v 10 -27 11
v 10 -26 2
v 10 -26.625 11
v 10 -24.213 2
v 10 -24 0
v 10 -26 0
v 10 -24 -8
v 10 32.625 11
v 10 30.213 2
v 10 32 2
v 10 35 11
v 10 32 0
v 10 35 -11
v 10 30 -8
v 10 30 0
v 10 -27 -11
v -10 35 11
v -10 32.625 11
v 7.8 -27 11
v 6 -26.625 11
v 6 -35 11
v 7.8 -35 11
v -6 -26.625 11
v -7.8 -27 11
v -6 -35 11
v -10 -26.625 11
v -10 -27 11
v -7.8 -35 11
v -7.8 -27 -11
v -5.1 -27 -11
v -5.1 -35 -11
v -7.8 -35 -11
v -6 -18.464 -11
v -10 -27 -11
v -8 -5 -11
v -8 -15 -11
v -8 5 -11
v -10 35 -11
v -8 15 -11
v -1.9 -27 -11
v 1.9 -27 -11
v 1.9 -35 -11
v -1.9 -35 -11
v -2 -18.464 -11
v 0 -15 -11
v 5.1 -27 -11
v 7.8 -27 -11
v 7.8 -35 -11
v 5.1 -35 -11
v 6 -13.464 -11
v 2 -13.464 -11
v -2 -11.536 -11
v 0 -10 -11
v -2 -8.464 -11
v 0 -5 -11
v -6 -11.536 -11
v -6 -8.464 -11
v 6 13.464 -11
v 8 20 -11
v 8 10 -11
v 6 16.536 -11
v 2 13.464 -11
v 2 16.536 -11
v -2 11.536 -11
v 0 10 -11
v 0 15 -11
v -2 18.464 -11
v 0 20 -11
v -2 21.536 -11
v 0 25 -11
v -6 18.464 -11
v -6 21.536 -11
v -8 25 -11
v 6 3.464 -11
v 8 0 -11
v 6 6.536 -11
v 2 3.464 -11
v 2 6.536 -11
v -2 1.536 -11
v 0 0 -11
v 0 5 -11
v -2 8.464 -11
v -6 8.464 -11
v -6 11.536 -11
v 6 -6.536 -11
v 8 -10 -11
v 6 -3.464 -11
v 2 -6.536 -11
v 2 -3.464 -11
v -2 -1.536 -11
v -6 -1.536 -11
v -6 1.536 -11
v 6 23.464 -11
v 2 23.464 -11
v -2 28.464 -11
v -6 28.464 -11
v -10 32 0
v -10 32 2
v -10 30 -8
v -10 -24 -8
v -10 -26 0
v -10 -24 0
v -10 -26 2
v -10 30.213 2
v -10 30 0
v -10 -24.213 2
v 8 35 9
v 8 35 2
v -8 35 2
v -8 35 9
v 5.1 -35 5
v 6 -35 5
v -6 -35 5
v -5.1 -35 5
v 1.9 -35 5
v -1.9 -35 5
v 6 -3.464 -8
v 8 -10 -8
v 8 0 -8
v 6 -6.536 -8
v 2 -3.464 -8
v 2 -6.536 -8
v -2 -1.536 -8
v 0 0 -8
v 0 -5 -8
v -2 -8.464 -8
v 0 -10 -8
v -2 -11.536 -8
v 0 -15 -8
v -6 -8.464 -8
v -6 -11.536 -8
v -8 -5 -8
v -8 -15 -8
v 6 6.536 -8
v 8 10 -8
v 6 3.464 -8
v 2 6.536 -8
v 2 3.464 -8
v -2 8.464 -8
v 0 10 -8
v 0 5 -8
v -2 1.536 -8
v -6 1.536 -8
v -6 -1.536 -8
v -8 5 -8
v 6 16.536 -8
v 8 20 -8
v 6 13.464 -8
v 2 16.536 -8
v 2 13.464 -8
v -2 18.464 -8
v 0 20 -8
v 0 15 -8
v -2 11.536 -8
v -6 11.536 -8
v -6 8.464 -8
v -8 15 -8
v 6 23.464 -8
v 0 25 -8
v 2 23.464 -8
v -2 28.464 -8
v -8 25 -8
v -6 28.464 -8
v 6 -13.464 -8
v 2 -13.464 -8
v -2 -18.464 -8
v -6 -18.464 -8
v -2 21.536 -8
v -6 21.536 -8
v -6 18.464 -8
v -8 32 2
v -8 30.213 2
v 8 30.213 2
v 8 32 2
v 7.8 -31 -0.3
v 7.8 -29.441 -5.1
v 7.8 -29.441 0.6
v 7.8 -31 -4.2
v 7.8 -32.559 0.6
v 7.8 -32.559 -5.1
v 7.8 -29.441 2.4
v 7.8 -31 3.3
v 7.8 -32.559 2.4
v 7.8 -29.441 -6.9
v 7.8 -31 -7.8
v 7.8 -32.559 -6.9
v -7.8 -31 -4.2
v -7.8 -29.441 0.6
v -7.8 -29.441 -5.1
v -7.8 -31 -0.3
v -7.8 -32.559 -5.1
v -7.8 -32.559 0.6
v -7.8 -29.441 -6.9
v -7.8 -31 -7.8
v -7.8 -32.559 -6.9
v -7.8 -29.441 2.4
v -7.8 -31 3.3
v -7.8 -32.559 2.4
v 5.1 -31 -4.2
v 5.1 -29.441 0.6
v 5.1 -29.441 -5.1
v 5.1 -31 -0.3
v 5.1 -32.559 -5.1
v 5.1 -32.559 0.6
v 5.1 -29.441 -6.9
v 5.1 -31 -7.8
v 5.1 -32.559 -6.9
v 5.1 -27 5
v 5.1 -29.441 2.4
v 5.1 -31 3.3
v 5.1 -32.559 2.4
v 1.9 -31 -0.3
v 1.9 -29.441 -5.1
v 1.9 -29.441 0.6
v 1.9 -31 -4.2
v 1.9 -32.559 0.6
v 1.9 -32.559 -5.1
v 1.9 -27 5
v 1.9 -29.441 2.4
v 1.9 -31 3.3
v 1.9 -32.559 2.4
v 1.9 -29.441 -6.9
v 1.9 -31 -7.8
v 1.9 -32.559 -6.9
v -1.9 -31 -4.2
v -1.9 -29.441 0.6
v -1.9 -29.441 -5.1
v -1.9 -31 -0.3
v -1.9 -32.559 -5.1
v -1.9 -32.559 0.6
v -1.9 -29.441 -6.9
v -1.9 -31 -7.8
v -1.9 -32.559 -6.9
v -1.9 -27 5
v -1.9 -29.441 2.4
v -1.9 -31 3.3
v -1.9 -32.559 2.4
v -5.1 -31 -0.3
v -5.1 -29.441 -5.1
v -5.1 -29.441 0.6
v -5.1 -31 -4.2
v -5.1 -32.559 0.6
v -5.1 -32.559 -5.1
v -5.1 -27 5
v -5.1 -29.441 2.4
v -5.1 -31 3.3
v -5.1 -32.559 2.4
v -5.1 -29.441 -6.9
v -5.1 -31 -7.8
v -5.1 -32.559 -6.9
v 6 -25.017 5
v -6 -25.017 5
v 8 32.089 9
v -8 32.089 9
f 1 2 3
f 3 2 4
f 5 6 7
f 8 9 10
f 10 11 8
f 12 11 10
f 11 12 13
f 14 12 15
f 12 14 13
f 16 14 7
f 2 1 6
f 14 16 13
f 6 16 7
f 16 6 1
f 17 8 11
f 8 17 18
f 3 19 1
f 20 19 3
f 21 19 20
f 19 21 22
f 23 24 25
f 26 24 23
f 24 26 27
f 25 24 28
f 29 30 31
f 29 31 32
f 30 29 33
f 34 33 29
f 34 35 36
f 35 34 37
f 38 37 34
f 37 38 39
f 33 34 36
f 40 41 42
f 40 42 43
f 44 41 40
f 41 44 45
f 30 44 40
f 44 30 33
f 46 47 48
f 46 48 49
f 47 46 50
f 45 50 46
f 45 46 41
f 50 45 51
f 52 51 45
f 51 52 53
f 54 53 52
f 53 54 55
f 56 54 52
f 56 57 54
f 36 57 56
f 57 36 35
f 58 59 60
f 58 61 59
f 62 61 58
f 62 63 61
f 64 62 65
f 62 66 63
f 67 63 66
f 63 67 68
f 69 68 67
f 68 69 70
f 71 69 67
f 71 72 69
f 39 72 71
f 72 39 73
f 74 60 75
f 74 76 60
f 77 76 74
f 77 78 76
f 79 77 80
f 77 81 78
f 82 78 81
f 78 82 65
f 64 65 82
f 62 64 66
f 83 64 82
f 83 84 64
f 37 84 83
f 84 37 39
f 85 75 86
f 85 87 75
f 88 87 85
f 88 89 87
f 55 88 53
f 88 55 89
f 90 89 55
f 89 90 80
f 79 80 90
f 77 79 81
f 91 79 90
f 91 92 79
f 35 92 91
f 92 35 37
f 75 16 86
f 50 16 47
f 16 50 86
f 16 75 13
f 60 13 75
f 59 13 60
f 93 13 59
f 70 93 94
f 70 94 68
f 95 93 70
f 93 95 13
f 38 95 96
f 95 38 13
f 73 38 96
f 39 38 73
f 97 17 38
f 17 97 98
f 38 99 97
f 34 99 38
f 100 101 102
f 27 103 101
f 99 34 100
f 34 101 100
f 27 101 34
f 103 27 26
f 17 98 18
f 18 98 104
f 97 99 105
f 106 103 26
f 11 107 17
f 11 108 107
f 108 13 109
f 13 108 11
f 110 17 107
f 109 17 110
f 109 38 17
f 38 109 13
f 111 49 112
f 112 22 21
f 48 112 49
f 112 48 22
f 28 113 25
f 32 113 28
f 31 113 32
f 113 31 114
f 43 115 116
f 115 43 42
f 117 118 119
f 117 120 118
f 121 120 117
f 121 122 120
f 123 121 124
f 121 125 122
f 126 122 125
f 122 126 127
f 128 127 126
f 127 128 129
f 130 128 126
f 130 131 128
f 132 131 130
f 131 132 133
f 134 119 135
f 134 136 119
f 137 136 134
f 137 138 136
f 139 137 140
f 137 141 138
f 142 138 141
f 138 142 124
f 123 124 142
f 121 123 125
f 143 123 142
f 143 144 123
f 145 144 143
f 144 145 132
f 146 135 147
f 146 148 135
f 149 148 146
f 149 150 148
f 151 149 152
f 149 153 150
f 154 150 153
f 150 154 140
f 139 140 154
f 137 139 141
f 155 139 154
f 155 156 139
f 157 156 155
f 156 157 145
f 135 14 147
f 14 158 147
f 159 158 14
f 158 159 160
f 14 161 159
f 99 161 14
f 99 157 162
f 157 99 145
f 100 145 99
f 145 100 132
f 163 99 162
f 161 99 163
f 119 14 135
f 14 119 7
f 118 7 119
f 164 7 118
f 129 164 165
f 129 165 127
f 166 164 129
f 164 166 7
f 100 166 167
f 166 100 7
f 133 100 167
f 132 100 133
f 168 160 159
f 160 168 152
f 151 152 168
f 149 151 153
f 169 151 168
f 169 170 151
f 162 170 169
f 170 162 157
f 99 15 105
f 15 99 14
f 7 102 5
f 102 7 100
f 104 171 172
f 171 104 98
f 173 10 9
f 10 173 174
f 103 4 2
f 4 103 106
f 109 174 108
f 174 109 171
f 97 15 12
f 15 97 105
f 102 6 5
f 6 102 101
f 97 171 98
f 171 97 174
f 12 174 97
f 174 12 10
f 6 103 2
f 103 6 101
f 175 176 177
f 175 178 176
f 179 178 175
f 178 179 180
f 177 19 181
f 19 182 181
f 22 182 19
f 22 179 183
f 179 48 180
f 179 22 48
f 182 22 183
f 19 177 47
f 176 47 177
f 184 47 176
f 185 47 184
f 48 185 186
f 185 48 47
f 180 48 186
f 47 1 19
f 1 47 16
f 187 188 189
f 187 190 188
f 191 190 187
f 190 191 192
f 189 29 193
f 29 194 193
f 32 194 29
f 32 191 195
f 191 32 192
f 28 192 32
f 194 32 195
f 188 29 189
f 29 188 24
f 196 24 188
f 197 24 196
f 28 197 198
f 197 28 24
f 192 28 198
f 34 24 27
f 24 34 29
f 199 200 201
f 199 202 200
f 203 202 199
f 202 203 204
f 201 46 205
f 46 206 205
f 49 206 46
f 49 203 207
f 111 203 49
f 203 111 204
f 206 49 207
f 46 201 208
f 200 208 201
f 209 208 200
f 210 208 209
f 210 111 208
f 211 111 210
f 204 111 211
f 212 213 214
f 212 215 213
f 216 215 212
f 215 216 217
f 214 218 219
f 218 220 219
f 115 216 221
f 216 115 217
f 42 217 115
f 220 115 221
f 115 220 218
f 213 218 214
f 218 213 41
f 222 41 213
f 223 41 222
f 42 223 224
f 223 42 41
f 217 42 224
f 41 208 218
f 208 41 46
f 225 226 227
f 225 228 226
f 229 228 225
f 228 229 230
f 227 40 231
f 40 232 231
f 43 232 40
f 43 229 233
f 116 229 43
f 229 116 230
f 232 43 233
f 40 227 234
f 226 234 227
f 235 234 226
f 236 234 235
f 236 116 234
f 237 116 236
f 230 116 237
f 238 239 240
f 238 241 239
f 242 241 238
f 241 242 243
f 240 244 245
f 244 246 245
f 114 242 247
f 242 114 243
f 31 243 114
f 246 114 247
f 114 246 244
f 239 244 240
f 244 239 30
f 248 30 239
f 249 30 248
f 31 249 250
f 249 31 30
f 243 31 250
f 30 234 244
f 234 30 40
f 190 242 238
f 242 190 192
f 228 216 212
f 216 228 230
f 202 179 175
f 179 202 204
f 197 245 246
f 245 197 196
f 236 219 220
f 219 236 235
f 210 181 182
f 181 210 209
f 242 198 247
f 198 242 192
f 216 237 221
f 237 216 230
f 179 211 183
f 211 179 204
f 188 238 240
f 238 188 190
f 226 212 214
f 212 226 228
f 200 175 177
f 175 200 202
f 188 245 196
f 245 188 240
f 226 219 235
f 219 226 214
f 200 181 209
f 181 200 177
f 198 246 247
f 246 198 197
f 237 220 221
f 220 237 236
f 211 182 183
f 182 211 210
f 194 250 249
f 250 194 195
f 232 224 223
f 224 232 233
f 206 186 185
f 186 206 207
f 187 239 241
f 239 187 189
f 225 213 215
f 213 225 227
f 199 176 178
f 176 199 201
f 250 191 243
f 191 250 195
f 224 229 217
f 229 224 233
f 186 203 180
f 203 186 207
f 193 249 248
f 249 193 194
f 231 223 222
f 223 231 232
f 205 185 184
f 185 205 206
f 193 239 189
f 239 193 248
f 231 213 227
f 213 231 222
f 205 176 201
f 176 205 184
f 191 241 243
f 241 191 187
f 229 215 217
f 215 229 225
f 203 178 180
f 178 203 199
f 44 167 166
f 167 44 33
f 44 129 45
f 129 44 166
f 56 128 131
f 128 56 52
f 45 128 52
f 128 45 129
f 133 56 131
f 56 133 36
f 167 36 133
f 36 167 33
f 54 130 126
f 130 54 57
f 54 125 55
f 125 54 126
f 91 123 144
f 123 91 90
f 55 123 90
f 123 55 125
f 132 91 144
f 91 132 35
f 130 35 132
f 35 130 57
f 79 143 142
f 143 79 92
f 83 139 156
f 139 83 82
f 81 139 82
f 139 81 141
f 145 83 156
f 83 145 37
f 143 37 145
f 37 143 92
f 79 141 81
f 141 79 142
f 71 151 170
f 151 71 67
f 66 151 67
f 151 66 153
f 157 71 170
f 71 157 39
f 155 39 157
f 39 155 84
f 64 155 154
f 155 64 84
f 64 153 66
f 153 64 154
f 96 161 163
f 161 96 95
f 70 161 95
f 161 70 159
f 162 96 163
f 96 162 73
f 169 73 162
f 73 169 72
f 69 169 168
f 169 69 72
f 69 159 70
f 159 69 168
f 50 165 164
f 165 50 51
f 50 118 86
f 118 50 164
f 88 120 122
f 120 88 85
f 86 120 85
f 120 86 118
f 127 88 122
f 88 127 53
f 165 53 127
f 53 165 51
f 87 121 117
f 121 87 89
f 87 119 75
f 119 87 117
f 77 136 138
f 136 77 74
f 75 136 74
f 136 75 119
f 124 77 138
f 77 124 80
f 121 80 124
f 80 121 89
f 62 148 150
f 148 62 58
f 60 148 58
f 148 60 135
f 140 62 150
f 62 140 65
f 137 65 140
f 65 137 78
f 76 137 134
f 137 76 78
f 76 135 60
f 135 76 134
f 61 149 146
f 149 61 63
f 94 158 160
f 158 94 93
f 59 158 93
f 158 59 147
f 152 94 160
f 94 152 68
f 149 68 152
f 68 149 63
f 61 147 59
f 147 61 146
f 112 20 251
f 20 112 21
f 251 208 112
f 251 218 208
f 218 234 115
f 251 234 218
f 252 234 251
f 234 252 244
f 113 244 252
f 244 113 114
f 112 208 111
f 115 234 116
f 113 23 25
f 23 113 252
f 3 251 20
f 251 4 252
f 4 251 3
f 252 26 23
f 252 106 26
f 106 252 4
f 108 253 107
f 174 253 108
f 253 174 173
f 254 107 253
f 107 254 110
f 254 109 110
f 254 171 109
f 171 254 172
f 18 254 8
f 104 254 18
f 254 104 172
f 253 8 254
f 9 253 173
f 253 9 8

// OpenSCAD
difference () {
  cube ([20, 70, 22], center=true);
  translate ([0, 3, 1.5]) {
    cube ([20, 54, 19], center=true);
  }
  translate ([0, 3, 1]) {
    cube ([20, 58, 2], center=true);
  }
  translate ([8.9, -31, ]) {
    cube ([2.2, 8, 22], center=true);
  }
  translate ([-8.9, -31, ]) {
    cube ([2.2, 8, 22], center=true);
  }
  translate ([3.5, -31, ]) {
    cube ([3.2, 8, 22], center=true);
  }
  translate ([-3.5, -31, ]) {
    cube ([3.2, 8, 22], center=true);
  }
  translate ([0, -31, 1.5]) {
    rotate (a=90.0, v=[0, 1, 0]) {
      cylinder (h=20, r=1.8, center=true);
    }
  }
  translate ([0, -31, -6]) {
    rotate (a=90.0, v=[0, 1, 0]) {
      cylinder (h=20, r=1.8, center=true);
    }
  }
  translate ([-4, -15, ]) {
    cylinder ($fn=6, h=22, r=4, center=true);
  }
  translate ([-4, -5, ]) {
    cylinder ($fn=6, h=22, r=4, center=true);
  }
  translate ([-4, 5, ]) {
    cylinder ($fn=6, h=22, r=4, center=true);
  }
  translate ([-4, 15, ]) {
    cylinder ($fn=6, h=22, r=4, center=true);
  }
  translate ([-4, 25, ]) {
    cylinder ($fn=6, h=22, r=4, center=true);
  }
  translate ([4, -10, ]) {
    cylinder ($fn=6, h=22, r=4, center=true);
  }
  translate ([4, 0, ]) {
    cylinder ($fn=6, h=22, r=4, center=true);
  }
  translate ([4, 10, ]) {
    cylinder ($fn=6, h=22, r=4, center=true);
  }
  translate ([4, 20, ]) {
    cylinder ($fn=6, h=22, r=4, center=true);
  }
  translate ([0, -28.5, 9.5]) {
    cube ([12, 13, 9], center=true);
  }
  translate ([0, -24, 7]) {
    rotate (a=14.999999999999998, v=[1, 0, 0]) {
      cube ([20, 3, 10], center=true);
    }
  }
  translate ([0, 32.5, 5.5]) {
    cube ([16, 5, 7], center=true);
  }
  translate ([0, 30, 7]) {
    rotate (a=-14.999999999999998, v=[1, 0, 0]) {
      cube ([20, 3, 10], center=true);
    }
  }
}
